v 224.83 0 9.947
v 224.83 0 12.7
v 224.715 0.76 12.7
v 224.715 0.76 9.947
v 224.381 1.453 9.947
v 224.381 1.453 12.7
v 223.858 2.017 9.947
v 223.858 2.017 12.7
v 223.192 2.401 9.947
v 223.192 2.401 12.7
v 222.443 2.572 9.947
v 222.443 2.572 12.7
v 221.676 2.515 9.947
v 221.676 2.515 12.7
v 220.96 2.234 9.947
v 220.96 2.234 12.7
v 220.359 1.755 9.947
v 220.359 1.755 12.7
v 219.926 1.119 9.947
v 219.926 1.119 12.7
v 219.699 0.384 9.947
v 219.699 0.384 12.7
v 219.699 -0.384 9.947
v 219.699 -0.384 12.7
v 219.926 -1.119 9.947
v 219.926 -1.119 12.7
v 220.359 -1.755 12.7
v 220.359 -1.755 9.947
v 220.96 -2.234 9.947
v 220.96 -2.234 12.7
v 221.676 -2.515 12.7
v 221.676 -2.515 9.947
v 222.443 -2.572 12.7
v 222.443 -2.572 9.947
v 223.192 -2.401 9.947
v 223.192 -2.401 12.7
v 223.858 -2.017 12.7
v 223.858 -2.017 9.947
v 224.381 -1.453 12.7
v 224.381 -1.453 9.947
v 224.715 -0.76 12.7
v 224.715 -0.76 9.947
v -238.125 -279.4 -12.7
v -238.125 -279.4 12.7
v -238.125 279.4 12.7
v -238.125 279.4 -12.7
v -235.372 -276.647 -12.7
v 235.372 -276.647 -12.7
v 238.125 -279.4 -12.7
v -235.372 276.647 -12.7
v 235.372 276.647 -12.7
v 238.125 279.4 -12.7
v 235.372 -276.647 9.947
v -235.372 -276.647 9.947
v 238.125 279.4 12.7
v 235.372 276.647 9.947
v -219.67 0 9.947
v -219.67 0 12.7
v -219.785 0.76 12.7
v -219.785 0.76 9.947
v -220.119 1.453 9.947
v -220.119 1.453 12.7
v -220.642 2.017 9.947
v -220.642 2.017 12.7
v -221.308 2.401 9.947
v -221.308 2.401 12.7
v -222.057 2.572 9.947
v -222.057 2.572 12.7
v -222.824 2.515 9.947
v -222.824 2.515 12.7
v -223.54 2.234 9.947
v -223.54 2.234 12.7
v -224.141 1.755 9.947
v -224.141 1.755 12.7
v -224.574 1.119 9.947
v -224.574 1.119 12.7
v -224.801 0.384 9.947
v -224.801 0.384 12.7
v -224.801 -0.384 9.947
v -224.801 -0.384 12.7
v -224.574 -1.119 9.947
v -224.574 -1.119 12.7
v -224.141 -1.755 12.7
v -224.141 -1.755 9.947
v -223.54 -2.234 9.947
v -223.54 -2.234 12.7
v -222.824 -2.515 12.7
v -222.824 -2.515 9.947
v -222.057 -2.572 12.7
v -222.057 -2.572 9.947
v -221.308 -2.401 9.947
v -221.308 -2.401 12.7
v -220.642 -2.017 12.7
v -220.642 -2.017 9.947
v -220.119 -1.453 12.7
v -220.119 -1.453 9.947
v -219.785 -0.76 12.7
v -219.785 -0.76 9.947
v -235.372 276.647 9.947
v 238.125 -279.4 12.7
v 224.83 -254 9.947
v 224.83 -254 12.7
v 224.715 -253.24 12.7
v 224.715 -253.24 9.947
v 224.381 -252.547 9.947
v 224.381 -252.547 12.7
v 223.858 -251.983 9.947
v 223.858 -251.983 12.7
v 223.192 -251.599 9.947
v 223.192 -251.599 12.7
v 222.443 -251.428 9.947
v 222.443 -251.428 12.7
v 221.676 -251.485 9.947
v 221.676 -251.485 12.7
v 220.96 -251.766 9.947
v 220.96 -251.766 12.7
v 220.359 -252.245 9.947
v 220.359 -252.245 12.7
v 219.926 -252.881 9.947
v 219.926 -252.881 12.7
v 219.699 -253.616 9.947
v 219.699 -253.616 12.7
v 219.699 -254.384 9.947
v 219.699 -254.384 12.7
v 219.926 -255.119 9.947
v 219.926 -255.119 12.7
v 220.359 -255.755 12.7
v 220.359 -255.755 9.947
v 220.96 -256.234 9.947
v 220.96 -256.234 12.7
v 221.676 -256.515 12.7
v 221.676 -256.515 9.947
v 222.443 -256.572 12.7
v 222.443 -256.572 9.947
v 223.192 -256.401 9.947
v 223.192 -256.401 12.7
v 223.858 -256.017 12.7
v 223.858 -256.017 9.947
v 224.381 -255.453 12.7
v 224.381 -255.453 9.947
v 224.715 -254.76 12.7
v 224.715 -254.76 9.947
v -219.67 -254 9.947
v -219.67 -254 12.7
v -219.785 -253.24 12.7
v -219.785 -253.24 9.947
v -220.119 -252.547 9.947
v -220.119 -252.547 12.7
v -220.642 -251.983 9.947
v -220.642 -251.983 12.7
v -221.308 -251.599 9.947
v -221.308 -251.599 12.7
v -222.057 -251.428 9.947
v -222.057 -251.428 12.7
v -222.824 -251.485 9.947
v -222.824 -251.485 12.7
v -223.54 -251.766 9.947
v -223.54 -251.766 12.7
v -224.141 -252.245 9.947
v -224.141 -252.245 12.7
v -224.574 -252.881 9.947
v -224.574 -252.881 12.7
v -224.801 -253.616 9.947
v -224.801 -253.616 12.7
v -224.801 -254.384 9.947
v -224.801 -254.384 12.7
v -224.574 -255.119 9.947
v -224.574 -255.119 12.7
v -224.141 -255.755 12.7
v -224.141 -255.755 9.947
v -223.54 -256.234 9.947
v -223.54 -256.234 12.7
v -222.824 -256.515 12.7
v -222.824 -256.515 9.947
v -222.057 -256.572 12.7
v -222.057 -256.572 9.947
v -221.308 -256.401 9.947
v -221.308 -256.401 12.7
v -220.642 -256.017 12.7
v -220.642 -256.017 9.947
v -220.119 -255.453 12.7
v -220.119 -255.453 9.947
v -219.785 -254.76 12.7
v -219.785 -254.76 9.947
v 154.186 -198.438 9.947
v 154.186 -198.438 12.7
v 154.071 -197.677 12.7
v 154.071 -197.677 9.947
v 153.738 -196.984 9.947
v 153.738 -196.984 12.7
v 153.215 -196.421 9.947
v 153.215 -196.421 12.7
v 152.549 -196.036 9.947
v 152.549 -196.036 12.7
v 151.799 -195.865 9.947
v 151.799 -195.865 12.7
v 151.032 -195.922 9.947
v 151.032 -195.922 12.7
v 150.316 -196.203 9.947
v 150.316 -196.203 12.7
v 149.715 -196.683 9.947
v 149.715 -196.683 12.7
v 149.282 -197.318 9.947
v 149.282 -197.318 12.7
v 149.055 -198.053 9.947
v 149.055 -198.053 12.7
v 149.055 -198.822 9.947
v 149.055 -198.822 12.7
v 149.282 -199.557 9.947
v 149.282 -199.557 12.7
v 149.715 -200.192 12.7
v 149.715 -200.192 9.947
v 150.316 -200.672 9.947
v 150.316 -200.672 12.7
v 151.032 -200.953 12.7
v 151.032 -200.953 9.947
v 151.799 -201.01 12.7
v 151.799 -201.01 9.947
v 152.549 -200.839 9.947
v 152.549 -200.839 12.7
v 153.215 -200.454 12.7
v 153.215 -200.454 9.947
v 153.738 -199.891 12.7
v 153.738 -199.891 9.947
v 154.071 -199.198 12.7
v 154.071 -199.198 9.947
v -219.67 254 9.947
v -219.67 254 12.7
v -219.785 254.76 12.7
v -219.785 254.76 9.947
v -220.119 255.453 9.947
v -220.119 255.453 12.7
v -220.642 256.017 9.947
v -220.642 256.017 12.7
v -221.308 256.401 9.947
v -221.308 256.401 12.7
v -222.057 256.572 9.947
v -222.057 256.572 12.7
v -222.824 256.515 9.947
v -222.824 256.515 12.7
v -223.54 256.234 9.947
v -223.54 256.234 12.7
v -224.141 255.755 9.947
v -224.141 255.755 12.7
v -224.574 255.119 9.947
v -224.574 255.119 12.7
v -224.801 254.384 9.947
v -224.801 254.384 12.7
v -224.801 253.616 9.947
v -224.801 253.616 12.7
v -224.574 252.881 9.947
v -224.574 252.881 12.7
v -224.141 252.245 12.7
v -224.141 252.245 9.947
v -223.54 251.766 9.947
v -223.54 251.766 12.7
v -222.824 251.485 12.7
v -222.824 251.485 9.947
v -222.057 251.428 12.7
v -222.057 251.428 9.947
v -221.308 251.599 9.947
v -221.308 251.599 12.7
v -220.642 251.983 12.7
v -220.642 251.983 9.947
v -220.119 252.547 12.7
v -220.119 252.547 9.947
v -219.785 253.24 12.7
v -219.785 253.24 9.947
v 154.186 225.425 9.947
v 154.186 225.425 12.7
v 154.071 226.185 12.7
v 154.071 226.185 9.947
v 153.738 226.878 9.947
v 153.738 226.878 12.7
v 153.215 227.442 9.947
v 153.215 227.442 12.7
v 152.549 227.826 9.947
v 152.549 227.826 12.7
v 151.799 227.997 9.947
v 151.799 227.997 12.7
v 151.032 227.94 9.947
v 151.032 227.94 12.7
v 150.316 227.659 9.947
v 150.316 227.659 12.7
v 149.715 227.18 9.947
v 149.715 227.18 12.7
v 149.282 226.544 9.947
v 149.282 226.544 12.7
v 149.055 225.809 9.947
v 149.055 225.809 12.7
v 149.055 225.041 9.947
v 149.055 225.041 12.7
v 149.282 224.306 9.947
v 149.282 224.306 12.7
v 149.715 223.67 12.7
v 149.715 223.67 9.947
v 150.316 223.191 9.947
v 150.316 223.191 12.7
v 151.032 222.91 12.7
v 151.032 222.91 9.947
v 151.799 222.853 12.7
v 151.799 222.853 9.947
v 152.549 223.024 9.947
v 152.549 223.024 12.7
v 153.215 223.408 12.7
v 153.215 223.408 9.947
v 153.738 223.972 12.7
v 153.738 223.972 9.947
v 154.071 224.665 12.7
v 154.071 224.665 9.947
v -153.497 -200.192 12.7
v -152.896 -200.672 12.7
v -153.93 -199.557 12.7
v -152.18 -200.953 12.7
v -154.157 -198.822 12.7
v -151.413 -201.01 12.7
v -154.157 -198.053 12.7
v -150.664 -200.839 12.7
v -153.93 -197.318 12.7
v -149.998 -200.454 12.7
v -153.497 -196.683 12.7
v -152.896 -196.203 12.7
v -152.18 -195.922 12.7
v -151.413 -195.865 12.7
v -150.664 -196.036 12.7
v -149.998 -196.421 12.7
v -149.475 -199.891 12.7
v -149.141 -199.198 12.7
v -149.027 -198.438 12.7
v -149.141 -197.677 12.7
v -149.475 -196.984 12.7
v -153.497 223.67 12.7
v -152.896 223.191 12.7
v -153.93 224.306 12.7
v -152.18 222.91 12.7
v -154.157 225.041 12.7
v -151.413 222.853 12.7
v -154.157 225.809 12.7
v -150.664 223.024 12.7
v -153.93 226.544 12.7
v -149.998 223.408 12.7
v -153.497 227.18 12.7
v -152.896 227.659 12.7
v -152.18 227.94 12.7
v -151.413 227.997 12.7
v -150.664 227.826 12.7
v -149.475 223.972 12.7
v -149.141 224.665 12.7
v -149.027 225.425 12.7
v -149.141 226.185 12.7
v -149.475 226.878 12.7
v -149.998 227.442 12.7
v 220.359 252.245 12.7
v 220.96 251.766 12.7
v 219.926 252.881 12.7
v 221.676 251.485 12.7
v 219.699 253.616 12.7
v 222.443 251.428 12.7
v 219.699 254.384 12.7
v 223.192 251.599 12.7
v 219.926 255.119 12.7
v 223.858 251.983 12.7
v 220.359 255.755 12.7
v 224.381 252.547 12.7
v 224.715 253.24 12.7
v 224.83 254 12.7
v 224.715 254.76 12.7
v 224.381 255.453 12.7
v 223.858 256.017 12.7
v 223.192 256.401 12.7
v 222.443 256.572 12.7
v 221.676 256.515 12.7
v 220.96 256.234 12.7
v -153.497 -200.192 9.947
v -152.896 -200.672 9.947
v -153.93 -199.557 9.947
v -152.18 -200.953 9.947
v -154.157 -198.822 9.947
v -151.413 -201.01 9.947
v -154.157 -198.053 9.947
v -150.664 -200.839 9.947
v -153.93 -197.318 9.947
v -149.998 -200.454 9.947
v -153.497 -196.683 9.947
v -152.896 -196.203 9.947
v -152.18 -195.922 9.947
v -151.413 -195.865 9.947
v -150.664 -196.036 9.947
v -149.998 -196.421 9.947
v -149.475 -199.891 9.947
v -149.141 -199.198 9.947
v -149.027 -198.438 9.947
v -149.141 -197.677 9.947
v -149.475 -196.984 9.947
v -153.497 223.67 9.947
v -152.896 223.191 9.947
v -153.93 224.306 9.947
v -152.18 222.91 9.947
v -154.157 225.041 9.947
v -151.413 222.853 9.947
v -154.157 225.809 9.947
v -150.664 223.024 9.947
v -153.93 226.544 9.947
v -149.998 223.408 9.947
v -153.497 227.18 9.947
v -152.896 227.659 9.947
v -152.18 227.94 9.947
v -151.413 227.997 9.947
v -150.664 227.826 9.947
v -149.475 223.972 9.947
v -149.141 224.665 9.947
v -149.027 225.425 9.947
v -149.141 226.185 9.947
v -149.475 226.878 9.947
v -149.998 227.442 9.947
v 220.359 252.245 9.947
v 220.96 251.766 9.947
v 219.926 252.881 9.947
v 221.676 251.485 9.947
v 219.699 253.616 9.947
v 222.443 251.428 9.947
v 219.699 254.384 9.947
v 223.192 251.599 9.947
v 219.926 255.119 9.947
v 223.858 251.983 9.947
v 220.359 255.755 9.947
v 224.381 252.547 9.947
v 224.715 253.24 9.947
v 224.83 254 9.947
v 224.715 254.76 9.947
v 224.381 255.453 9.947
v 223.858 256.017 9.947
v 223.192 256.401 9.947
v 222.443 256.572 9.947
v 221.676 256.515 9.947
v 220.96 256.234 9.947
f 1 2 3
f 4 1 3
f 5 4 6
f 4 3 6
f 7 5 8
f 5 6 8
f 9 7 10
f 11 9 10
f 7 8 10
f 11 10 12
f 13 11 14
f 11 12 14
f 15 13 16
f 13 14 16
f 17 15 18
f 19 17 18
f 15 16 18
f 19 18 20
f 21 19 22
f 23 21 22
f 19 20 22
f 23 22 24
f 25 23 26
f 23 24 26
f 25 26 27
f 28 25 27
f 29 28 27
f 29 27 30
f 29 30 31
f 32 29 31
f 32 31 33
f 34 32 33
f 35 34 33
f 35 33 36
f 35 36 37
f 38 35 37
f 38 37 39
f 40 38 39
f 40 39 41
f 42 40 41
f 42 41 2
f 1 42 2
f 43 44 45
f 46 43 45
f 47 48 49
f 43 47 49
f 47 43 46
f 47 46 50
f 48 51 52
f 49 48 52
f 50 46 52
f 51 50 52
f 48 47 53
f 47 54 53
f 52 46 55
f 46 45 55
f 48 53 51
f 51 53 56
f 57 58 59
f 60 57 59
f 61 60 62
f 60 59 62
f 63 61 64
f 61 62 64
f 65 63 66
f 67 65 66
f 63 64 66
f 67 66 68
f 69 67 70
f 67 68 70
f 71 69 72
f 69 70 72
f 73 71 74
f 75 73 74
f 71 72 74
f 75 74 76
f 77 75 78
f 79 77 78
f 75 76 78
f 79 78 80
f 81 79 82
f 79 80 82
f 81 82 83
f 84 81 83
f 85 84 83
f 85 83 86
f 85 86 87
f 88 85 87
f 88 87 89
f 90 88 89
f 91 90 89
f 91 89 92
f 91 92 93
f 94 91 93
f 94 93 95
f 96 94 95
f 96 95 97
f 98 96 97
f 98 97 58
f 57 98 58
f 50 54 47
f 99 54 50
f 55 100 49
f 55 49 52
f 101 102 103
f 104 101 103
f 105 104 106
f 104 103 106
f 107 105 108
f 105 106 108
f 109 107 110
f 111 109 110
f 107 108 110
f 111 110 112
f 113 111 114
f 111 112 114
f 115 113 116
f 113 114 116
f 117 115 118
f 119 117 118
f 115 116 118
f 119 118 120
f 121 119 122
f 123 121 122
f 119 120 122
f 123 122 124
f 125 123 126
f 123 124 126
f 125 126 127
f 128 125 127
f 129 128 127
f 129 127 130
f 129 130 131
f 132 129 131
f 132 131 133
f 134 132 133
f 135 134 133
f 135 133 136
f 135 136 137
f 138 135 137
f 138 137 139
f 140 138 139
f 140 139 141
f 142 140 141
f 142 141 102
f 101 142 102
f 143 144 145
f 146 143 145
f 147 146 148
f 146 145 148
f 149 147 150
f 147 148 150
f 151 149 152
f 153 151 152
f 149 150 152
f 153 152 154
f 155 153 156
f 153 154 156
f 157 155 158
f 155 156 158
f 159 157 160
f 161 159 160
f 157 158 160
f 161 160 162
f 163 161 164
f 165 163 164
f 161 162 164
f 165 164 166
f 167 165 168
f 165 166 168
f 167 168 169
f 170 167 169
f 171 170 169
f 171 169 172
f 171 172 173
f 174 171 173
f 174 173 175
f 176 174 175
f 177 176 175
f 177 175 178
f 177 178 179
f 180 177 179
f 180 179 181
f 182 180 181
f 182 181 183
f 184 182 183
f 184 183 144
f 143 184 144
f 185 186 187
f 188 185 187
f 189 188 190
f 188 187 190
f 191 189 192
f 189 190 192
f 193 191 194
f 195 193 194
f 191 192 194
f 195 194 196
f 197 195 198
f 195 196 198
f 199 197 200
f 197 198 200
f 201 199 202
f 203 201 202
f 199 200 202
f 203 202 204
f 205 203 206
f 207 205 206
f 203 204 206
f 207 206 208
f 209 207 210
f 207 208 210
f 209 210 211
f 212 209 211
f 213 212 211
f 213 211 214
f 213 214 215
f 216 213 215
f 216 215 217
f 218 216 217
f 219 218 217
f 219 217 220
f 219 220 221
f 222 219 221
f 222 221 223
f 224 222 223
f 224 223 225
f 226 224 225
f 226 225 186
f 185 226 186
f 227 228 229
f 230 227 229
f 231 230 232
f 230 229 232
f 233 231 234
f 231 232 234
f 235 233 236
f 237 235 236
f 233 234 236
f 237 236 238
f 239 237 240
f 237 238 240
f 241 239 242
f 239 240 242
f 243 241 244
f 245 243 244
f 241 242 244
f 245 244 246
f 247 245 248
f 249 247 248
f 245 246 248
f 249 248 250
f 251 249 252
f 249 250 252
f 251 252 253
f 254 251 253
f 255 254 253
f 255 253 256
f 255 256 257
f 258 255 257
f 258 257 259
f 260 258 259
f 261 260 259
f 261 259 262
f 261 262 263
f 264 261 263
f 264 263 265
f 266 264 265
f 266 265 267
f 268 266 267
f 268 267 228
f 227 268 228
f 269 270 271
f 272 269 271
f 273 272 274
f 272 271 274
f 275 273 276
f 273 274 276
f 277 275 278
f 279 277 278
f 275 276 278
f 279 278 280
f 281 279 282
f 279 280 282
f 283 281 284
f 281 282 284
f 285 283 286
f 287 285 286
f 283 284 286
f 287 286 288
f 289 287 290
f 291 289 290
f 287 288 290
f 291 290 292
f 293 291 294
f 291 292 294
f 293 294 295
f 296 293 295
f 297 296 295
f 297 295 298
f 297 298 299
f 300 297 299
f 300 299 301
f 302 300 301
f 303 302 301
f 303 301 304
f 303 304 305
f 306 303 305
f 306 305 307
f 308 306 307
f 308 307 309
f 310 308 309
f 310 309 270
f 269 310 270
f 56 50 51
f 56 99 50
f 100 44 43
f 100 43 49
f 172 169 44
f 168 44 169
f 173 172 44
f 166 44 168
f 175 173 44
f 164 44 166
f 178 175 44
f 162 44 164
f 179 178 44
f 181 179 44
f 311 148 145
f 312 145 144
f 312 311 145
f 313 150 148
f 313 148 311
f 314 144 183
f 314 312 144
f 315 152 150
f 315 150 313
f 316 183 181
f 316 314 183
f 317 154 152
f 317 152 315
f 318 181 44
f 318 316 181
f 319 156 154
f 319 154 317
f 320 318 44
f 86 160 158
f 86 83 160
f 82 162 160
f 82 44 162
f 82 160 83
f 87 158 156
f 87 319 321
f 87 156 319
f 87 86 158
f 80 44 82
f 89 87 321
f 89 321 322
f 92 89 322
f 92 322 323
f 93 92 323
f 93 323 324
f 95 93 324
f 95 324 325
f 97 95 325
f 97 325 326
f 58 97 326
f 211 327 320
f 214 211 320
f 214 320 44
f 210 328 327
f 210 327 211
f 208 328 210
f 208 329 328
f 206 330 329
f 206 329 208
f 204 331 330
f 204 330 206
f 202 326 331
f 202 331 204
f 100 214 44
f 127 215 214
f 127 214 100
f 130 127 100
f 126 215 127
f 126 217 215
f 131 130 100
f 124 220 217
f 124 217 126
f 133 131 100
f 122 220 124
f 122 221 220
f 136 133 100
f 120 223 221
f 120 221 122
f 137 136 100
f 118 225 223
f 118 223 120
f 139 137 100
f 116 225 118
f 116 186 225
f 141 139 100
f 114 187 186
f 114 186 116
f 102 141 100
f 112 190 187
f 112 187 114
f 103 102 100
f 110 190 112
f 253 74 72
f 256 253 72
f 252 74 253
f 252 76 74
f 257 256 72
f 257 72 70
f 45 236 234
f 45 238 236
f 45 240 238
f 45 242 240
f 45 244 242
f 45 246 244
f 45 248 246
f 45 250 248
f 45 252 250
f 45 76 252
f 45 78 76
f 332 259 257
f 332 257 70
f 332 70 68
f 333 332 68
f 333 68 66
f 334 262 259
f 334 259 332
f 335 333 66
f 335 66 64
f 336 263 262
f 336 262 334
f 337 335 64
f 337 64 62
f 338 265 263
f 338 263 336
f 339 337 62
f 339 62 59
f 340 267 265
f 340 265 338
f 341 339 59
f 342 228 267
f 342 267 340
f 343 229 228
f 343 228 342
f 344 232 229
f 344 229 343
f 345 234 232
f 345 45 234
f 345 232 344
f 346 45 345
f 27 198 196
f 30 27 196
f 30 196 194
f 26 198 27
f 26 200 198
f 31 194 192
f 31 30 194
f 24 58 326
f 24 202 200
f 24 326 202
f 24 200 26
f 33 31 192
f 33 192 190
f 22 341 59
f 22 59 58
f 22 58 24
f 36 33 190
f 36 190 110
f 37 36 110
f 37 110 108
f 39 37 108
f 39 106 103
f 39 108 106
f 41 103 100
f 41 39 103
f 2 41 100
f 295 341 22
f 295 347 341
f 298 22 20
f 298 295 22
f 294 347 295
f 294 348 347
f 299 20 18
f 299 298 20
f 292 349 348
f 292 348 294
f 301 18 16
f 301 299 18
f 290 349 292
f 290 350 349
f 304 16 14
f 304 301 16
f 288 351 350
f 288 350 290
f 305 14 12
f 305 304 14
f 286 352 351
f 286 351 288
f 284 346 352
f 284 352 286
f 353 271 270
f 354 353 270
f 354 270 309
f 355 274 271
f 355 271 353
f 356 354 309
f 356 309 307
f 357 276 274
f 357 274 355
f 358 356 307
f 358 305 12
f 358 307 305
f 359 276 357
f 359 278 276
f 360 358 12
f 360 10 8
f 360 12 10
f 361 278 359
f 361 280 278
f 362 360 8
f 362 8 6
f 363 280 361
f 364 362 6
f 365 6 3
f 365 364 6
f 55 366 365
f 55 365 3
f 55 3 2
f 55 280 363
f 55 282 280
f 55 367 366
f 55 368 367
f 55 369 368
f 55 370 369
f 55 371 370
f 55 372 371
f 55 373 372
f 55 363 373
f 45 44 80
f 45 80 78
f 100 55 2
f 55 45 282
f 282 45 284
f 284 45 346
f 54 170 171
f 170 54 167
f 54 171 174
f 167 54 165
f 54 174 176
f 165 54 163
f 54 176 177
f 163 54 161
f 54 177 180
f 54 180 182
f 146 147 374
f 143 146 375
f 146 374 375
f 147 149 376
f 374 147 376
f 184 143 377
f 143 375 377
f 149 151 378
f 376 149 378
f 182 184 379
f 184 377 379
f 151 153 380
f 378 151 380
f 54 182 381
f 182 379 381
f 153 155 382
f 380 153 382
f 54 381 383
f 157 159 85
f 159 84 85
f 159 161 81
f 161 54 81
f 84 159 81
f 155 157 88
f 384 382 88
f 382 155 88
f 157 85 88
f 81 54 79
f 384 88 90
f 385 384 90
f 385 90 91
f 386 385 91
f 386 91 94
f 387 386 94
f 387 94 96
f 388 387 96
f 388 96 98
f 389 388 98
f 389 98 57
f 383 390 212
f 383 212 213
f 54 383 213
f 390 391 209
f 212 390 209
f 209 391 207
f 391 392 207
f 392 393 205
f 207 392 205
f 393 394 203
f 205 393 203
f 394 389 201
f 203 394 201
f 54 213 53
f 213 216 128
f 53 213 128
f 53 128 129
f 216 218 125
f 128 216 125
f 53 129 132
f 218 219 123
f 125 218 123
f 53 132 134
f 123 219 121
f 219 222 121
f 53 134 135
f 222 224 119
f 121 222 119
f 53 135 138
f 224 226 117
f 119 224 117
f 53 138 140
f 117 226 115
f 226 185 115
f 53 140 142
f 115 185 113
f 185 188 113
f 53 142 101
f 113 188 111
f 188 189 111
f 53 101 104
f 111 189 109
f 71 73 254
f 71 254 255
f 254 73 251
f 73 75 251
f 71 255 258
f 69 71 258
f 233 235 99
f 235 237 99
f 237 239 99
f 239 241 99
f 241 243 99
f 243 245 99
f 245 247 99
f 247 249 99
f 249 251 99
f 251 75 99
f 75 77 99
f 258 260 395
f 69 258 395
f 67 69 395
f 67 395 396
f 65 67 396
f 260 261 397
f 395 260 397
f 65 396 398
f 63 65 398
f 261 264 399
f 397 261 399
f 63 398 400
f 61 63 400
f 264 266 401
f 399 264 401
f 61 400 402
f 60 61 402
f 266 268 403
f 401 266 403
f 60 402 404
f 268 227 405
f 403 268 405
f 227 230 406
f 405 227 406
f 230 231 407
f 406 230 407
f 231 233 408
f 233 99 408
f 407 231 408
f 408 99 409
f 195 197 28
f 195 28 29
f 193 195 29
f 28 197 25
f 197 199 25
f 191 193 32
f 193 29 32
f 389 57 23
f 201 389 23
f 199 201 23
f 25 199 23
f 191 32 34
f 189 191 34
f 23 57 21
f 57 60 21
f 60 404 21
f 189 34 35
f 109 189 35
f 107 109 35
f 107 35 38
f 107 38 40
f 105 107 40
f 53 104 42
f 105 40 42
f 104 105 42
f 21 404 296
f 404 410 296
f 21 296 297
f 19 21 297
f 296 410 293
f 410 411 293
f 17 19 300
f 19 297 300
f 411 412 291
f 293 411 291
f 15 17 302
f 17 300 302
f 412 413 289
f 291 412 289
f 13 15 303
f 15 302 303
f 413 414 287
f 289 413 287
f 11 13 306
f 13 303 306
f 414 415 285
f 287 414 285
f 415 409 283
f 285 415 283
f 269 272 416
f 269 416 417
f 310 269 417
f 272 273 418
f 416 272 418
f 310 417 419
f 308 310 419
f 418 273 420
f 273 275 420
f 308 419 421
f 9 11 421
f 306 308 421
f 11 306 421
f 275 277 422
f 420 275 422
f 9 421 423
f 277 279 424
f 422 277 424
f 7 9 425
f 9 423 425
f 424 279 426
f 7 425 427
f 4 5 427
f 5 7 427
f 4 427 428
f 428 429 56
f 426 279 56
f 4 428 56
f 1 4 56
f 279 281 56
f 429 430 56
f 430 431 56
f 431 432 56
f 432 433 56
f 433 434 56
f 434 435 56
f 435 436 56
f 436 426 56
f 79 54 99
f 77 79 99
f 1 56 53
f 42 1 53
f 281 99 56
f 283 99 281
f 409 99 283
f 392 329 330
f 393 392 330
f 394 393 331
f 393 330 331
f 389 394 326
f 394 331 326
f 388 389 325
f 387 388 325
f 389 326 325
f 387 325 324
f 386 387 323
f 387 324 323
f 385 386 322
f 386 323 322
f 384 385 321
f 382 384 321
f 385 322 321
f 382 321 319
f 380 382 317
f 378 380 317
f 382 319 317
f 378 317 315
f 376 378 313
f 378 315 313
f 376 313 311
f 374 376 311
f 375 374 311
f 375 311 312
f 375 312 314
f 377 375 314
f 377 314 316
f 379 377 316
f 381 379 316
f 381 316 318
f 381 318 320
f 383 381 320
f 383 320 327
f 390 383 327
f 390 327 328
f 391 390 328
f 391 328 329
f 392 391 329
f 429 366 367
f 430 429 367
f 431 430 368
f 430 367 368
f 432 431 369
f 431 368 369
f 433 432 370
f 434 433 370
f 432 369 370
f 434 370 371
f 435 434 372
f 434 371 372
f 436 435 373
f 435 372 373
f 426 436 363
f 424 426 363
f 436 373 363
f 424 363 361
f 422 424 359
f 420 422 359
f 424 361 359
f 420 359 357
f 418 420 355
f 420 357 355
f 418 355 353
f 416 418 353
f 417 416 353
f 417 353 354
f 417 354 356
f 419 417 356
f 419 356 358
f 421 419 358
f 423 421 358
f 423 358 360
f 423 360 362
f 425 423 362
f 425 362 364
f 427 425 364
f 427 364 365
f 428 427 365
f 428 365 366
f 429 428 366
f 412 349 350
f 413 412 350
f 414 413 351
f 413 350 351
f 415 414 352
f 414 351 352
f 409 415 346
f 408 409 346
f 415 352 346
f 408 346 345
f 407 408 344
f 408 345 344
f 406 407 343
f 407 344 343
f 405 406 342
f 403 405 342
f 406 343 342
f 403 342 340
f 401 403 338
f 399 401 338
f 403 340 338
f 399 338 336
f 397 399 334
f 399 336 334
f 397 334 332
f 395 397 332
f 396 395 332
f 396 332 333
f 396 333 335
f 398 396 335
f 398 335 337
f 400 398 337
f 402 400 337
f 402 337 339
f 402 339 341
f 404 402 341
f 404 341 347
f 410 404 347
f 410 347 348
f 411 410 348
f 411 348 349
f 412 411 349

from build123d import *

# Parameters (mm, degrees)
F0_W     = 476.25
F0_H     = 558.8
F1_DEPTH = 12.7
F2_T     = -2.75336
F3_R     = 2.579688
F4_DEPTH = 25.401


with BuildPart() as f1:
    # F0 (on Top) → F1 (new body, symmetric)
    with BuildSketch(Plane.XY):
        Rectangle(F0_W, F0_H)
    extrude(amount=F1_DEPTH, both=True)

    # F2
    f2_openings = [f1.faces().sort_by_distance(p)[0] for p in [
        (0, 0, -12.7),
    ]]
    offset(amount=F2_T, openings=f2_openings)

    # F3 (on face) → F4 (cut, through all)
    with BuildSketch(Plane.XY.offset(12.7)):
        with Locations((-151.60625, 225.425)):
            Circle(F3_R)
        with Locations((151.60625, 225.425)):
            Circle(F3_R)
        with Locations((151.60625, -198.4375)):
            Circle(F3_R)
        with Locations((-151.60625, -198.4375)):
            Circle(F3_R)
        with Locations((-222.25, -254)):
            Circle(F3_R)
        with Locations((-222.25, 254)):
            Circle(F3_R)
        with Locations((222.25, -254)):
            Circle(F3_R)
        with Locations((222.25, 254)):
            Circle(F3_R)
        with Locations((-222.25, 0)):
            Circle(F3_R)
        with Locations((222.25, 0)):
            Circle(F3_R)
    extrude(amount=-F4_DEPTH, mode=Mode.SUBTRACT)


solid = f1.part
